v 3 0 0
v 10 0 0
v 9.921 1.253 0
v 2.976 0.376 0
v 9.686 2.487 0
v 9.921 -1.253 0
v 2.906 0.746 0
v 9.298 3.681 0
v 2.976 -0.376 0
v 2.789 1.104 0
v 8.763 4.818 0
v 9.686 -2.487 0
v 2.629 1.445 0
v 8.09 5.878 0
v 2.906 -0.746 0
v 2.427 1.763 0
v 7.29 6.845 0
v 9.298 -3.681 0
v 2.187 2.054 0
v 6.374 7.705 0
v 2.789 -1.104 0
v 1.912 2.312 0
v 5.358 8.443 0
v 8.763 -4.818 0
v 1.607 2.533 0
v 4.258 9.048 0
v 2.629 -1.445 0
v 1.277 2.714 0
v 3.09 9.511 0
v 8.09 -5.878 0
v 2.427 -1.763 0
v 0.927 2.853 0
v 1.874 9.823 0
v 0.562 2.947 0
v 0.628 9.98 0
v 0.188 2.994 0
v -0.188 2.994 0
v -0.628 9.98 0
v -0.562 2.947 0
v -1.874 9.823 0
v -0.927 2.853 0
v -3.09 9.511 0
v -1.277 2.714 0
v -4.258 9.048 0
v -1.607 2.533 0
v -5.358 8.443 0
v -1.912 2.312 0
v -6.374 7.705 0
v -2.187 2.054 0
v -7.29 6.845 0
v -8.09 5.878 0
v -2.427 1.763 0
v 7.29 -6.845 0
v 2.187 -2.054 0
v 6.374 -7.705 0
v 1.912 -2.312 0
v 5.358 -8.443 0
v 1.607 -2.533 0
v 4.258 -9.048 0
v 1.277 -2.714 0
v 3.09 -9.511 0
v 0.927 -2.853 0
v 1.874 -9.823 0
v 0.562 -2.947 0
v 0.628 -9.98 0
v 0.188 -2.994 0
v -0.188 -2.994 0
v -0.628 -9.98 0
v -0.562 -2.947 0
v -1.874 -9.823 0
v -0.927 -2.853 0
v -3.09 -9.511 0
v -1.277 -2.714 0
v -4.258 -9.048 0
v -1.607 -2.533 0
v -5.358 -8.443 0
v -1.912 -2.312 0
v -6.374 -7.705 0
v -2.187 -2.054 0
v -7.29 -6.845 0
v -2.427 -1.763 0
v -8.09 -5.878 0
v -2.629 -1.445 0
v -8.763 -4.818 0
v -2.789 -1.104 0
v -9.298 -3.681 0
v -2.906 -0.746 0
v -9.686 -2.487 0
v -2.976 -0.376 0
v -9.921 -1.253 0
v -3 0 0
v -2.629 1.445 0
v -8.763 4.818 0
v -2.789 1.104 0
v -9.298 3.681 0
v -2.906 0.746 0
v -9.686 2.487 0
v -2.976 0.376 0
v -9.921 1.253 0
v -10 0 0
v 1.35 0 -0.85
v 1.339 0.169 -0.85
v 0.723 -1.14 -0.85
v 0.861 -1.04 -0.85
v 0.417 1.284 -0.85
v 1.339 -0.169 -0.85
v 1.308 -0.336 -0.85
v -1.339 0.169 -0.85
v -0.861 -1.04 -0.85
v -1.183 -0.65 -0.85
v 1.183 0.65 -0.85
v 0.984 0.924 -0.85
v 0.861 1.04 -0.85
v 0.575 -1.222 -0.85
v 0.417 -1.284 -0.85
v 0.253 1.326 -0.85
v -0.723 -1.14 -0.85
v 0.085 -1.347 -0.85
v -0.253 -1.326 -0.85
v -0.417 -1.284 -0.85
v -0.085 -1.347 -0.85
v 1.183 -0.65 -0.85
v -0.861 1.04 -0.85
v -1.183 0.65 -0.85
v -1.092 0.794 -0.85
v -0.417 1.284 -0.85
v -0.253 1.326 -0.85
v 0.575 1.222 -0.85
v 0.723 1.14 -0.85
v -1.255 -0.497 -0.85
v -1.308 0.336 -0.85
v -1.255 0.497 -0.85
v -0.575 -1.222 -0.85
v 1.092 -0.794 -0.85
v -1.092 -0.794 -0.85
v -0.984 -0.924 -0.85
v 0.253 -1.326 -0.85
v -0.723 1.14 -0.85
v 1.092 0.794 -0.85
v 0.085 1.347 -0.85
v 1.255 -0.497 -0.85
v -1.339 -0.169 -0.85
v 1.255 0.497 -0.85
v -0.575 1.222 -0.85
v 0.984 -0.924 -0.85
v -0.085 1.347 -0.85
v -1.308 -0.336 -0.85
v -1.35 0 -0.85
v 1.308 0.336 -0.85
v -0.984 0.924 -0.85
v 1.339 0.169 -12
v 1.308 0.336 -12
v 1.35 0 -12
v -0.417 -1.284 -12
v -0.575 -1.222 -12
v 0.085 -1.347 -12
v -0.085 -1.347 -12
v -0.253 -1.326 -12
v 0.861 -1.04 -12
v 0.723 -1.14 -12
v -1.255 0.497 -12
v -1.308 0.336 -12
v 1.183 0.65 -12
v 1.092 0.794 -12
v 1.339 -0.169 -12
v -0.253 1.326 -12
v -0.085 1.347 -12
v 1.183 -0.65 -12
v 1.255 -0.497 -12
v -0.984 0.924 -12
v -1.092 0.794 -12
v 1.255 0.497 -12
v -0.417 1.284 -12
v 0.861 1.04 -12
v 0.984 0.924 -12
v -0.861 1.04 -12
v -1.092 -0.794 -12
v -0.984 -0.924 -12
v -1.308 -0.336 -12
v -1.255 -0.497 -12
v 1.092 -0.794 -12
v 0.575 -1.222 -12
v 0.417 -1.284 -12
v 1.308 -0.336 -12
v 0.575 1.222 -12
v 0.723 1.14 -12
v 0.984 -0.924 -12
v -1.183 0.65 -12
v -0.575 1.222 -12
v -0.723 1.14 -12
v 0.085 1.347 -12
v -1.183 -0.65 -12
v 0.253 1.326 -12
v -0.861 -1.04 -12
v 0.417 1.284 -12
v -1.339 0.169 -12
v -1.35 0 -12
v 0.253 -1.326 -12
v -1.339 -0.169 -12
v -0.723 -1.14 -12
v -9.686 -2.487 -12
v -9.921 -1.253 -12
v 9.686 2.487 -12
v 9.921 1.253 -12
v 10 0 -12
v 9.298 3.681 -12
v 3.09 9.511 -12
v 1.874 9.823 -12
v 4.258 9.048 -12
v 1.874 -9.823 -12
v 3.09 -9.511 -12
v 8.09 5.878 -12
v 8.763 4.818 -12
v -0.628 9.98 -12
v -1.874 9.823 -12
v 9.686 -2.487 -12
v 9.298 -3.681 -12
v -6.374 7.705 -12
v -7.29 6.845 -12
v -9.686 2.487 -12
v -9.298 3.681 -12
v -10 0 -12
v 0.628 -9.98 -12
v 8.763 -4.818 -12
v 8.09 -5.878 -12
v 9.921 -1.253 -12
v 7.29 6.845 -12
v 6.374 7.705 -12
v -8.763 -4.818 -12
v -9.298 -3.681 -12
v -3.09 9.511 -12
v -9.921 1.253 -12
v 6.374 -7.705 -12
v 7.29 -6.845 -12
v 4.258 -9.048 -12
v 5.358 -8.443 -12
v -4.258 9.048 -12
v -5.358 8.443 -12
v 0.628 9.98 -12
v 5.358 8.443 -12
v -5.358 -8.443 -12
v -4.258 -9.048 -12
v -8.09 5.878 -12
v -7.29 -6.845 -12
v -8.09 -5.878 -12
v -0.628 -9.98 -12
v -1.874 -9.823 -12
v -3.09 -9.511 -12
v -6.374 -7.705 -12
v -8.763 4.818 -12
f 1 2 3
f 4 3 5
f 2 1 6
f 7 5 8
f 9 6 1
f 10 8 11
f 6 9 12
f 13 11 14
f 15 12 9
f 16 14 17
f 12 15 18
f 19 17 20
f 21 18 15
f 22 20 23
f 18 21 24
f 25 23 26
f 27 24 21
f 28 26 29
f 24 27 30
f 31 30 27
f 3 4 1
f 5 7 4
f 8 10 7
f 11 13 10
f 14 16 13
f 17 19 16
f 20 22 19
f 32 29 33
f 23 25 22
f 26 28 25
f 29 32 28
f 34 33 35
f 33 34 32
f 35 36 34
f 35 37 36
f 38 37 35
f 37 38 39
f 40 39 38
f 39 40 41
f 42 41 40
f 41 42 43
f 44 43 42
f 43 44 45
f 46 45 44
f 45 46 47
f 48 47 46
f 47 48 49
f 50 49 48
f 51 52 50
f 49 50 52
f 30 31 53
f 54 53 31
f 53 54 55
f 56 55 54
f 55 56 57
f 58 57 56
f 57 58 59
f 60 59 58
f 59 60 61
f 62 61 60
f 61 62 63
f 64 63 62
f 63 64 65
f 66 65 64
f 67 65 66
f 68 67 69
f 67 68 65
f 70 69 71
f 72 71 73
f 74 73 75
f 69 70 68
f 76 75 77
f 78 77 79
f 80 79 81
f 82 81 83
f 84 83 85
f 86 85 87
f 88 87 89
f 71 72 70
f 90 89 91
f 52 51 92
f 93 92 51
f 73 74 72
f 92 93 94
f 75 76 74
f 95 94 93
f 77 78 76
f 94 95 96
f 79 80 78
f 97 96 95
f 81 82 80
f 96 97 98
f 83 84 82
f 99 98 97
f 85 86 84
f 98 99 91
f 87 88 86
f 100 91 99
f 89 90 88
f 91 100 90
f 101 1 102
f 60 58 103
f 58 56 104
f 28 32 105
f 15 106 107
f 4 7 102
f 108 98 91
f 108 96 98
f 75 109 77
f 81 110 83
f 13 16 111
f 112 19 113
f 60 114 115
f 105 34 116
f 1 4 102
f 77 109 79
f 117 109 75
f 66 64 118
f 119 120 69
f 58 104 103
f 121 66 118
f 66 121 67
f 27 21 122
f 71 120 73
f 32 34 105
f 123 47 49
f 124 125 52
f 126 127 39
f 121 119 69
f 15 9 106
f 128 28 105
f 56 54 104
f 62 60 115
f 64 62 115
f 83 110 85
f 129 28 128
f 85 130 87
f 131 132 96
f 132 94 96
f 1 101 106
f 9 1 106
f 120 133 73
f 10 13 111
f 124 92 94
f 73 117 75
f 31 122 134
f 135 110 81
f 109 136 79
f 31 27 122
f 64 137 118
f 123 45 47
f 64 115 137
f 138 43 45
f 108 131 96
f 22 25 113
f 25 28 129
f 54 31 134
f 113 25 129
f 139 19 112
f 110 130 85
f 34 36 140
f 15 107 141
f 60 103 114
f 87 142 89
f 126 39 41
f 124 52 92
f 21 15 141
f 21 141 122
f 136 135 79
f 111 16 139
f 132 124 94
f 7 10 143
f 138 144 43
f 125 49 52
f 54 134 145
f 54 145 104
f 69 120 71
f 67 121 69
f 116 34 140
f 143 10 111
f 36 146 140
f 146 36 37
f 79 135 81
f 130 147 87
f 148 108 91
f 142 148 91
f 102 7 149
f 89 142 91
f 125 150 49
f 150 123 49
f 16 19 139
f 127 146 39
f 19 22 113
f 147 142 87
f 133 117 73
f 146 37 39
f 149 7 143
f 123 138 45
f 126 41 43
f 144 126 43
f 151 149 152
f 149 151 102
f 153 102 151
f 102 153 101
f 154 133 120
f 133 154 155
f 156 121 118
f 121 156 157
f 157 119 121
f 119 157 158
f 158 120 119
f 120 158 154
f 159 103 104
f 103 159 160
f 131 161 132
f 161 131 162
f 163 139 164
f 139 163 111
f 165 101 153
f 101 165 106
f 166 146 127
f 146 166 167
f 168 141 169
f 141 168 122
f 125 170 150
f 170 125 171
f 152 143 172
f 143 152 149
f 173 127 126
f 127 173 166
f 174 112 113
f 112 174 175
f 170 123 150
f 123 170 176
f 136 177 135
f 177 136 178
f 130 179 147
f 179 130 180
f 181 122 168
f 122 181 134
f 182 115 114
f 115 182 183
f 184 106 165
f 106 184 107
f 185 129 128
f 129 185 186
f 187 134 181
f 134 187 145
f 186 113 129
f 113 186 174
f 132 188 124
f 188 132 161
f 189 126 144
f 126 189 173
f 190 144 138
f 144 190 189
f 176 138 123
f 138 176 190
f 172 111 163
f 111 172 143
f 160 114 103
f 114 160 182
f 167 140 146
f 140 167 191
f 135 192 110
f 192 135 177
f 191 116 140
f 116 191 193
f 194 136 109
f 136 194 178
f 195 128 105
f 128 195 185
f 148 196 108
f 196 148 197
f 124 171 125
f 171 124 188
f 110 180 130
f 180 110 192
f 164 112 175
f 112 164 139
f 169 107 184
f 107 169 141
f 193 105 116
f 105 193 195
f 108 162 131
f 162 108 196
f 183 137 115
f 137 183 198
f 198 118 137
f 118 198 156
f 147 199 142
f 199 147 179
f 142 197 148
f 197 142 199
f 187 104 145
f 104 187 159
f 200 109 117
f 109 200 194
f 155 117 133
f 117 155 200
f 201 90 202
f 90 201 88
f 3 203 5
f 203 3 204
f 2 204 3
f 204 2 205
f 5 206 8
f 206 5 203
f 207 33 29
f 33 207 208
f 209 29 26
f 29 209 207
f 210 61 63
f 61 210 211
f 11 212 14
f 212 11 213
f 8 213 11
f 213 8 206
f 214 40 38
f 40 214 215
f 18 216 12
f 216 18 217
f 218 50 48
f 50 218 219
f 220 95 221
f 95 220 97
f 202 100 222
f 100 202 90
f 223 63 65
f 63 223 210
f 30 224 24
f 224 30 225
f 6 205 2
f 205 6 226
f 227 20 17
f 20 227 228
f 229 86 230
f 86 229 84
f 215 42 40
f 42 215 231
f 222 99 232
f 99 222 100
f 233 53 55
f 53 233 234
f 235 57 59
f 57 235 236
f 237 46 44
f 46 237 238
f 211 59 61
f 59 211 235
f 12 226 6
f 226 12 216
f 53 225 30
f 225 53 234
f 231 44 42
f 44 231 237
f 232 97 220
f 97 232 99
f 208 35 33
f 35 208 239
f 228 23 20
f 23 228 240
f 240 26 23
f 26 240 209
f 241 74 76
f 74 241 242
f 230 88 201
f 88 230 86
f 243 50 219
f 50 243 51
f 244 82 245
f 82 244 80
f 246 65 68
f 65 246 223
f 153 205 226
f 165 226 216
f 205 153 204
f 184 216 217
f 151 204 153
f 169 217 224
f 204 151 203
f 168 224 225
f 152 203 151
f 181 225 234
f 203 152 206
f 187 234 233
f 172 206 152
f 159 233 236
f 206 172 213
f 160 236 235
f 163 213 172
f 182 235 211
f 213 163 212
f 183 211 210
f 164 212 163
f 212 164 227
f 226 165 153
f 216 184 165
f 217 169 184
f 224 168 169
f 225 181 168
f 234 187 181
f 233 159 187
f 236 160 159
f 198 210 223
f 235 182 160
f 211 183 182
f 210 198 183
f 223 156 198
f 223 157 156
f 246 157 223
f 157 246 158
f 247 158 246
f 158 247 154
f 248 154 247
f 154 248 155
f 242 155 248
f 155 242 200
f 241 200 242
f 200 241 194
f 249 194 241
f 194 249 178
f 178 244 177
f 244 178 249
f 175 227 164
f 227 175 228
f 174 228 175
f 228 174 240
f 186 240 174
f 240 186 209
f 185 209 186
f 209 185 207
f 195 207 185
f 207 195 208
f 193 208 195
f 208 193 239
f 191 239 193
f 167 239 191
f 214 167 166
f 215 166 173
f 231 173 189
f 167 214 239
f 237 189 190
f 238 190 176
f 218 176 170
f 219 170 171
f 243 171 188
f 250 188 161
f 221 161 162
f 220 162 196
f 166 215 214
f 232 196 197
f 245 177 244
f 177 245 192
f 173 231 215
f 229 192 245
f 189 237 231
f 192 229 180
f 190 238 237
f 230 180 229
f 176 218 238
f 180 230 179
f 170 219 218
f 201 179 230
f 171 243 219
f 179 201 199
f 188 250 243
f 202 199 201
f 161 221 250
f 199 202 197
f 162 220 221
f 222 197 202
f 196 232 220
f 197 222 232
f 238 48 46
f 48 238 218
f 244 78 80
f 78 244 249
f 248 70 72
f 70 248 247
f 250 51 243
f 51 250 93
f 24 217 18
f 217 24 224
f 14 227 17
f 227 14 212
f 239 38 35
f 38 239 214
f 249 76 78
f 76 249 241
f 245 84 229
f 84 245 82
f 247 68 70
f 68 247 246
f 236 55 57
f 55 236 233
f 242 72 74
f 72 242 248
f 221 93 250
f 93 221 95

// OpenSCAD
$fn = 50;


difference() {
	union() {
		translate(v = [0, 0, -12.0000000000]) {
			cylinder(h = 12, r = 10.0000000000);
		}
	}
	union() {
		translate(v = [0, 0, 0]) {
			rotate(a = [0, 0, 0]) {
				difference() {
					union() {
						translate(v = [0, 0, -15.0000000000]) {
							cylinder(h = 15, r = 1.0000000000);
						}
						translate(v = [0, 0, -0.8500000000]) {
							cylinder(h = 0.8500000000, r1 = 1.3500000000, r2 = 3.0000000000);
						}
						translate(v = [0, 0, -15.0000000000]) {
							cylinder(h = 15, r = 1.3500000000);
						}
						translate(v = [0, 0, -15.0000000000]) {
							cylinder(h = 15, r = 1.0000000000);
						}
					}
					union();
				}
			}
		}
	}
}
